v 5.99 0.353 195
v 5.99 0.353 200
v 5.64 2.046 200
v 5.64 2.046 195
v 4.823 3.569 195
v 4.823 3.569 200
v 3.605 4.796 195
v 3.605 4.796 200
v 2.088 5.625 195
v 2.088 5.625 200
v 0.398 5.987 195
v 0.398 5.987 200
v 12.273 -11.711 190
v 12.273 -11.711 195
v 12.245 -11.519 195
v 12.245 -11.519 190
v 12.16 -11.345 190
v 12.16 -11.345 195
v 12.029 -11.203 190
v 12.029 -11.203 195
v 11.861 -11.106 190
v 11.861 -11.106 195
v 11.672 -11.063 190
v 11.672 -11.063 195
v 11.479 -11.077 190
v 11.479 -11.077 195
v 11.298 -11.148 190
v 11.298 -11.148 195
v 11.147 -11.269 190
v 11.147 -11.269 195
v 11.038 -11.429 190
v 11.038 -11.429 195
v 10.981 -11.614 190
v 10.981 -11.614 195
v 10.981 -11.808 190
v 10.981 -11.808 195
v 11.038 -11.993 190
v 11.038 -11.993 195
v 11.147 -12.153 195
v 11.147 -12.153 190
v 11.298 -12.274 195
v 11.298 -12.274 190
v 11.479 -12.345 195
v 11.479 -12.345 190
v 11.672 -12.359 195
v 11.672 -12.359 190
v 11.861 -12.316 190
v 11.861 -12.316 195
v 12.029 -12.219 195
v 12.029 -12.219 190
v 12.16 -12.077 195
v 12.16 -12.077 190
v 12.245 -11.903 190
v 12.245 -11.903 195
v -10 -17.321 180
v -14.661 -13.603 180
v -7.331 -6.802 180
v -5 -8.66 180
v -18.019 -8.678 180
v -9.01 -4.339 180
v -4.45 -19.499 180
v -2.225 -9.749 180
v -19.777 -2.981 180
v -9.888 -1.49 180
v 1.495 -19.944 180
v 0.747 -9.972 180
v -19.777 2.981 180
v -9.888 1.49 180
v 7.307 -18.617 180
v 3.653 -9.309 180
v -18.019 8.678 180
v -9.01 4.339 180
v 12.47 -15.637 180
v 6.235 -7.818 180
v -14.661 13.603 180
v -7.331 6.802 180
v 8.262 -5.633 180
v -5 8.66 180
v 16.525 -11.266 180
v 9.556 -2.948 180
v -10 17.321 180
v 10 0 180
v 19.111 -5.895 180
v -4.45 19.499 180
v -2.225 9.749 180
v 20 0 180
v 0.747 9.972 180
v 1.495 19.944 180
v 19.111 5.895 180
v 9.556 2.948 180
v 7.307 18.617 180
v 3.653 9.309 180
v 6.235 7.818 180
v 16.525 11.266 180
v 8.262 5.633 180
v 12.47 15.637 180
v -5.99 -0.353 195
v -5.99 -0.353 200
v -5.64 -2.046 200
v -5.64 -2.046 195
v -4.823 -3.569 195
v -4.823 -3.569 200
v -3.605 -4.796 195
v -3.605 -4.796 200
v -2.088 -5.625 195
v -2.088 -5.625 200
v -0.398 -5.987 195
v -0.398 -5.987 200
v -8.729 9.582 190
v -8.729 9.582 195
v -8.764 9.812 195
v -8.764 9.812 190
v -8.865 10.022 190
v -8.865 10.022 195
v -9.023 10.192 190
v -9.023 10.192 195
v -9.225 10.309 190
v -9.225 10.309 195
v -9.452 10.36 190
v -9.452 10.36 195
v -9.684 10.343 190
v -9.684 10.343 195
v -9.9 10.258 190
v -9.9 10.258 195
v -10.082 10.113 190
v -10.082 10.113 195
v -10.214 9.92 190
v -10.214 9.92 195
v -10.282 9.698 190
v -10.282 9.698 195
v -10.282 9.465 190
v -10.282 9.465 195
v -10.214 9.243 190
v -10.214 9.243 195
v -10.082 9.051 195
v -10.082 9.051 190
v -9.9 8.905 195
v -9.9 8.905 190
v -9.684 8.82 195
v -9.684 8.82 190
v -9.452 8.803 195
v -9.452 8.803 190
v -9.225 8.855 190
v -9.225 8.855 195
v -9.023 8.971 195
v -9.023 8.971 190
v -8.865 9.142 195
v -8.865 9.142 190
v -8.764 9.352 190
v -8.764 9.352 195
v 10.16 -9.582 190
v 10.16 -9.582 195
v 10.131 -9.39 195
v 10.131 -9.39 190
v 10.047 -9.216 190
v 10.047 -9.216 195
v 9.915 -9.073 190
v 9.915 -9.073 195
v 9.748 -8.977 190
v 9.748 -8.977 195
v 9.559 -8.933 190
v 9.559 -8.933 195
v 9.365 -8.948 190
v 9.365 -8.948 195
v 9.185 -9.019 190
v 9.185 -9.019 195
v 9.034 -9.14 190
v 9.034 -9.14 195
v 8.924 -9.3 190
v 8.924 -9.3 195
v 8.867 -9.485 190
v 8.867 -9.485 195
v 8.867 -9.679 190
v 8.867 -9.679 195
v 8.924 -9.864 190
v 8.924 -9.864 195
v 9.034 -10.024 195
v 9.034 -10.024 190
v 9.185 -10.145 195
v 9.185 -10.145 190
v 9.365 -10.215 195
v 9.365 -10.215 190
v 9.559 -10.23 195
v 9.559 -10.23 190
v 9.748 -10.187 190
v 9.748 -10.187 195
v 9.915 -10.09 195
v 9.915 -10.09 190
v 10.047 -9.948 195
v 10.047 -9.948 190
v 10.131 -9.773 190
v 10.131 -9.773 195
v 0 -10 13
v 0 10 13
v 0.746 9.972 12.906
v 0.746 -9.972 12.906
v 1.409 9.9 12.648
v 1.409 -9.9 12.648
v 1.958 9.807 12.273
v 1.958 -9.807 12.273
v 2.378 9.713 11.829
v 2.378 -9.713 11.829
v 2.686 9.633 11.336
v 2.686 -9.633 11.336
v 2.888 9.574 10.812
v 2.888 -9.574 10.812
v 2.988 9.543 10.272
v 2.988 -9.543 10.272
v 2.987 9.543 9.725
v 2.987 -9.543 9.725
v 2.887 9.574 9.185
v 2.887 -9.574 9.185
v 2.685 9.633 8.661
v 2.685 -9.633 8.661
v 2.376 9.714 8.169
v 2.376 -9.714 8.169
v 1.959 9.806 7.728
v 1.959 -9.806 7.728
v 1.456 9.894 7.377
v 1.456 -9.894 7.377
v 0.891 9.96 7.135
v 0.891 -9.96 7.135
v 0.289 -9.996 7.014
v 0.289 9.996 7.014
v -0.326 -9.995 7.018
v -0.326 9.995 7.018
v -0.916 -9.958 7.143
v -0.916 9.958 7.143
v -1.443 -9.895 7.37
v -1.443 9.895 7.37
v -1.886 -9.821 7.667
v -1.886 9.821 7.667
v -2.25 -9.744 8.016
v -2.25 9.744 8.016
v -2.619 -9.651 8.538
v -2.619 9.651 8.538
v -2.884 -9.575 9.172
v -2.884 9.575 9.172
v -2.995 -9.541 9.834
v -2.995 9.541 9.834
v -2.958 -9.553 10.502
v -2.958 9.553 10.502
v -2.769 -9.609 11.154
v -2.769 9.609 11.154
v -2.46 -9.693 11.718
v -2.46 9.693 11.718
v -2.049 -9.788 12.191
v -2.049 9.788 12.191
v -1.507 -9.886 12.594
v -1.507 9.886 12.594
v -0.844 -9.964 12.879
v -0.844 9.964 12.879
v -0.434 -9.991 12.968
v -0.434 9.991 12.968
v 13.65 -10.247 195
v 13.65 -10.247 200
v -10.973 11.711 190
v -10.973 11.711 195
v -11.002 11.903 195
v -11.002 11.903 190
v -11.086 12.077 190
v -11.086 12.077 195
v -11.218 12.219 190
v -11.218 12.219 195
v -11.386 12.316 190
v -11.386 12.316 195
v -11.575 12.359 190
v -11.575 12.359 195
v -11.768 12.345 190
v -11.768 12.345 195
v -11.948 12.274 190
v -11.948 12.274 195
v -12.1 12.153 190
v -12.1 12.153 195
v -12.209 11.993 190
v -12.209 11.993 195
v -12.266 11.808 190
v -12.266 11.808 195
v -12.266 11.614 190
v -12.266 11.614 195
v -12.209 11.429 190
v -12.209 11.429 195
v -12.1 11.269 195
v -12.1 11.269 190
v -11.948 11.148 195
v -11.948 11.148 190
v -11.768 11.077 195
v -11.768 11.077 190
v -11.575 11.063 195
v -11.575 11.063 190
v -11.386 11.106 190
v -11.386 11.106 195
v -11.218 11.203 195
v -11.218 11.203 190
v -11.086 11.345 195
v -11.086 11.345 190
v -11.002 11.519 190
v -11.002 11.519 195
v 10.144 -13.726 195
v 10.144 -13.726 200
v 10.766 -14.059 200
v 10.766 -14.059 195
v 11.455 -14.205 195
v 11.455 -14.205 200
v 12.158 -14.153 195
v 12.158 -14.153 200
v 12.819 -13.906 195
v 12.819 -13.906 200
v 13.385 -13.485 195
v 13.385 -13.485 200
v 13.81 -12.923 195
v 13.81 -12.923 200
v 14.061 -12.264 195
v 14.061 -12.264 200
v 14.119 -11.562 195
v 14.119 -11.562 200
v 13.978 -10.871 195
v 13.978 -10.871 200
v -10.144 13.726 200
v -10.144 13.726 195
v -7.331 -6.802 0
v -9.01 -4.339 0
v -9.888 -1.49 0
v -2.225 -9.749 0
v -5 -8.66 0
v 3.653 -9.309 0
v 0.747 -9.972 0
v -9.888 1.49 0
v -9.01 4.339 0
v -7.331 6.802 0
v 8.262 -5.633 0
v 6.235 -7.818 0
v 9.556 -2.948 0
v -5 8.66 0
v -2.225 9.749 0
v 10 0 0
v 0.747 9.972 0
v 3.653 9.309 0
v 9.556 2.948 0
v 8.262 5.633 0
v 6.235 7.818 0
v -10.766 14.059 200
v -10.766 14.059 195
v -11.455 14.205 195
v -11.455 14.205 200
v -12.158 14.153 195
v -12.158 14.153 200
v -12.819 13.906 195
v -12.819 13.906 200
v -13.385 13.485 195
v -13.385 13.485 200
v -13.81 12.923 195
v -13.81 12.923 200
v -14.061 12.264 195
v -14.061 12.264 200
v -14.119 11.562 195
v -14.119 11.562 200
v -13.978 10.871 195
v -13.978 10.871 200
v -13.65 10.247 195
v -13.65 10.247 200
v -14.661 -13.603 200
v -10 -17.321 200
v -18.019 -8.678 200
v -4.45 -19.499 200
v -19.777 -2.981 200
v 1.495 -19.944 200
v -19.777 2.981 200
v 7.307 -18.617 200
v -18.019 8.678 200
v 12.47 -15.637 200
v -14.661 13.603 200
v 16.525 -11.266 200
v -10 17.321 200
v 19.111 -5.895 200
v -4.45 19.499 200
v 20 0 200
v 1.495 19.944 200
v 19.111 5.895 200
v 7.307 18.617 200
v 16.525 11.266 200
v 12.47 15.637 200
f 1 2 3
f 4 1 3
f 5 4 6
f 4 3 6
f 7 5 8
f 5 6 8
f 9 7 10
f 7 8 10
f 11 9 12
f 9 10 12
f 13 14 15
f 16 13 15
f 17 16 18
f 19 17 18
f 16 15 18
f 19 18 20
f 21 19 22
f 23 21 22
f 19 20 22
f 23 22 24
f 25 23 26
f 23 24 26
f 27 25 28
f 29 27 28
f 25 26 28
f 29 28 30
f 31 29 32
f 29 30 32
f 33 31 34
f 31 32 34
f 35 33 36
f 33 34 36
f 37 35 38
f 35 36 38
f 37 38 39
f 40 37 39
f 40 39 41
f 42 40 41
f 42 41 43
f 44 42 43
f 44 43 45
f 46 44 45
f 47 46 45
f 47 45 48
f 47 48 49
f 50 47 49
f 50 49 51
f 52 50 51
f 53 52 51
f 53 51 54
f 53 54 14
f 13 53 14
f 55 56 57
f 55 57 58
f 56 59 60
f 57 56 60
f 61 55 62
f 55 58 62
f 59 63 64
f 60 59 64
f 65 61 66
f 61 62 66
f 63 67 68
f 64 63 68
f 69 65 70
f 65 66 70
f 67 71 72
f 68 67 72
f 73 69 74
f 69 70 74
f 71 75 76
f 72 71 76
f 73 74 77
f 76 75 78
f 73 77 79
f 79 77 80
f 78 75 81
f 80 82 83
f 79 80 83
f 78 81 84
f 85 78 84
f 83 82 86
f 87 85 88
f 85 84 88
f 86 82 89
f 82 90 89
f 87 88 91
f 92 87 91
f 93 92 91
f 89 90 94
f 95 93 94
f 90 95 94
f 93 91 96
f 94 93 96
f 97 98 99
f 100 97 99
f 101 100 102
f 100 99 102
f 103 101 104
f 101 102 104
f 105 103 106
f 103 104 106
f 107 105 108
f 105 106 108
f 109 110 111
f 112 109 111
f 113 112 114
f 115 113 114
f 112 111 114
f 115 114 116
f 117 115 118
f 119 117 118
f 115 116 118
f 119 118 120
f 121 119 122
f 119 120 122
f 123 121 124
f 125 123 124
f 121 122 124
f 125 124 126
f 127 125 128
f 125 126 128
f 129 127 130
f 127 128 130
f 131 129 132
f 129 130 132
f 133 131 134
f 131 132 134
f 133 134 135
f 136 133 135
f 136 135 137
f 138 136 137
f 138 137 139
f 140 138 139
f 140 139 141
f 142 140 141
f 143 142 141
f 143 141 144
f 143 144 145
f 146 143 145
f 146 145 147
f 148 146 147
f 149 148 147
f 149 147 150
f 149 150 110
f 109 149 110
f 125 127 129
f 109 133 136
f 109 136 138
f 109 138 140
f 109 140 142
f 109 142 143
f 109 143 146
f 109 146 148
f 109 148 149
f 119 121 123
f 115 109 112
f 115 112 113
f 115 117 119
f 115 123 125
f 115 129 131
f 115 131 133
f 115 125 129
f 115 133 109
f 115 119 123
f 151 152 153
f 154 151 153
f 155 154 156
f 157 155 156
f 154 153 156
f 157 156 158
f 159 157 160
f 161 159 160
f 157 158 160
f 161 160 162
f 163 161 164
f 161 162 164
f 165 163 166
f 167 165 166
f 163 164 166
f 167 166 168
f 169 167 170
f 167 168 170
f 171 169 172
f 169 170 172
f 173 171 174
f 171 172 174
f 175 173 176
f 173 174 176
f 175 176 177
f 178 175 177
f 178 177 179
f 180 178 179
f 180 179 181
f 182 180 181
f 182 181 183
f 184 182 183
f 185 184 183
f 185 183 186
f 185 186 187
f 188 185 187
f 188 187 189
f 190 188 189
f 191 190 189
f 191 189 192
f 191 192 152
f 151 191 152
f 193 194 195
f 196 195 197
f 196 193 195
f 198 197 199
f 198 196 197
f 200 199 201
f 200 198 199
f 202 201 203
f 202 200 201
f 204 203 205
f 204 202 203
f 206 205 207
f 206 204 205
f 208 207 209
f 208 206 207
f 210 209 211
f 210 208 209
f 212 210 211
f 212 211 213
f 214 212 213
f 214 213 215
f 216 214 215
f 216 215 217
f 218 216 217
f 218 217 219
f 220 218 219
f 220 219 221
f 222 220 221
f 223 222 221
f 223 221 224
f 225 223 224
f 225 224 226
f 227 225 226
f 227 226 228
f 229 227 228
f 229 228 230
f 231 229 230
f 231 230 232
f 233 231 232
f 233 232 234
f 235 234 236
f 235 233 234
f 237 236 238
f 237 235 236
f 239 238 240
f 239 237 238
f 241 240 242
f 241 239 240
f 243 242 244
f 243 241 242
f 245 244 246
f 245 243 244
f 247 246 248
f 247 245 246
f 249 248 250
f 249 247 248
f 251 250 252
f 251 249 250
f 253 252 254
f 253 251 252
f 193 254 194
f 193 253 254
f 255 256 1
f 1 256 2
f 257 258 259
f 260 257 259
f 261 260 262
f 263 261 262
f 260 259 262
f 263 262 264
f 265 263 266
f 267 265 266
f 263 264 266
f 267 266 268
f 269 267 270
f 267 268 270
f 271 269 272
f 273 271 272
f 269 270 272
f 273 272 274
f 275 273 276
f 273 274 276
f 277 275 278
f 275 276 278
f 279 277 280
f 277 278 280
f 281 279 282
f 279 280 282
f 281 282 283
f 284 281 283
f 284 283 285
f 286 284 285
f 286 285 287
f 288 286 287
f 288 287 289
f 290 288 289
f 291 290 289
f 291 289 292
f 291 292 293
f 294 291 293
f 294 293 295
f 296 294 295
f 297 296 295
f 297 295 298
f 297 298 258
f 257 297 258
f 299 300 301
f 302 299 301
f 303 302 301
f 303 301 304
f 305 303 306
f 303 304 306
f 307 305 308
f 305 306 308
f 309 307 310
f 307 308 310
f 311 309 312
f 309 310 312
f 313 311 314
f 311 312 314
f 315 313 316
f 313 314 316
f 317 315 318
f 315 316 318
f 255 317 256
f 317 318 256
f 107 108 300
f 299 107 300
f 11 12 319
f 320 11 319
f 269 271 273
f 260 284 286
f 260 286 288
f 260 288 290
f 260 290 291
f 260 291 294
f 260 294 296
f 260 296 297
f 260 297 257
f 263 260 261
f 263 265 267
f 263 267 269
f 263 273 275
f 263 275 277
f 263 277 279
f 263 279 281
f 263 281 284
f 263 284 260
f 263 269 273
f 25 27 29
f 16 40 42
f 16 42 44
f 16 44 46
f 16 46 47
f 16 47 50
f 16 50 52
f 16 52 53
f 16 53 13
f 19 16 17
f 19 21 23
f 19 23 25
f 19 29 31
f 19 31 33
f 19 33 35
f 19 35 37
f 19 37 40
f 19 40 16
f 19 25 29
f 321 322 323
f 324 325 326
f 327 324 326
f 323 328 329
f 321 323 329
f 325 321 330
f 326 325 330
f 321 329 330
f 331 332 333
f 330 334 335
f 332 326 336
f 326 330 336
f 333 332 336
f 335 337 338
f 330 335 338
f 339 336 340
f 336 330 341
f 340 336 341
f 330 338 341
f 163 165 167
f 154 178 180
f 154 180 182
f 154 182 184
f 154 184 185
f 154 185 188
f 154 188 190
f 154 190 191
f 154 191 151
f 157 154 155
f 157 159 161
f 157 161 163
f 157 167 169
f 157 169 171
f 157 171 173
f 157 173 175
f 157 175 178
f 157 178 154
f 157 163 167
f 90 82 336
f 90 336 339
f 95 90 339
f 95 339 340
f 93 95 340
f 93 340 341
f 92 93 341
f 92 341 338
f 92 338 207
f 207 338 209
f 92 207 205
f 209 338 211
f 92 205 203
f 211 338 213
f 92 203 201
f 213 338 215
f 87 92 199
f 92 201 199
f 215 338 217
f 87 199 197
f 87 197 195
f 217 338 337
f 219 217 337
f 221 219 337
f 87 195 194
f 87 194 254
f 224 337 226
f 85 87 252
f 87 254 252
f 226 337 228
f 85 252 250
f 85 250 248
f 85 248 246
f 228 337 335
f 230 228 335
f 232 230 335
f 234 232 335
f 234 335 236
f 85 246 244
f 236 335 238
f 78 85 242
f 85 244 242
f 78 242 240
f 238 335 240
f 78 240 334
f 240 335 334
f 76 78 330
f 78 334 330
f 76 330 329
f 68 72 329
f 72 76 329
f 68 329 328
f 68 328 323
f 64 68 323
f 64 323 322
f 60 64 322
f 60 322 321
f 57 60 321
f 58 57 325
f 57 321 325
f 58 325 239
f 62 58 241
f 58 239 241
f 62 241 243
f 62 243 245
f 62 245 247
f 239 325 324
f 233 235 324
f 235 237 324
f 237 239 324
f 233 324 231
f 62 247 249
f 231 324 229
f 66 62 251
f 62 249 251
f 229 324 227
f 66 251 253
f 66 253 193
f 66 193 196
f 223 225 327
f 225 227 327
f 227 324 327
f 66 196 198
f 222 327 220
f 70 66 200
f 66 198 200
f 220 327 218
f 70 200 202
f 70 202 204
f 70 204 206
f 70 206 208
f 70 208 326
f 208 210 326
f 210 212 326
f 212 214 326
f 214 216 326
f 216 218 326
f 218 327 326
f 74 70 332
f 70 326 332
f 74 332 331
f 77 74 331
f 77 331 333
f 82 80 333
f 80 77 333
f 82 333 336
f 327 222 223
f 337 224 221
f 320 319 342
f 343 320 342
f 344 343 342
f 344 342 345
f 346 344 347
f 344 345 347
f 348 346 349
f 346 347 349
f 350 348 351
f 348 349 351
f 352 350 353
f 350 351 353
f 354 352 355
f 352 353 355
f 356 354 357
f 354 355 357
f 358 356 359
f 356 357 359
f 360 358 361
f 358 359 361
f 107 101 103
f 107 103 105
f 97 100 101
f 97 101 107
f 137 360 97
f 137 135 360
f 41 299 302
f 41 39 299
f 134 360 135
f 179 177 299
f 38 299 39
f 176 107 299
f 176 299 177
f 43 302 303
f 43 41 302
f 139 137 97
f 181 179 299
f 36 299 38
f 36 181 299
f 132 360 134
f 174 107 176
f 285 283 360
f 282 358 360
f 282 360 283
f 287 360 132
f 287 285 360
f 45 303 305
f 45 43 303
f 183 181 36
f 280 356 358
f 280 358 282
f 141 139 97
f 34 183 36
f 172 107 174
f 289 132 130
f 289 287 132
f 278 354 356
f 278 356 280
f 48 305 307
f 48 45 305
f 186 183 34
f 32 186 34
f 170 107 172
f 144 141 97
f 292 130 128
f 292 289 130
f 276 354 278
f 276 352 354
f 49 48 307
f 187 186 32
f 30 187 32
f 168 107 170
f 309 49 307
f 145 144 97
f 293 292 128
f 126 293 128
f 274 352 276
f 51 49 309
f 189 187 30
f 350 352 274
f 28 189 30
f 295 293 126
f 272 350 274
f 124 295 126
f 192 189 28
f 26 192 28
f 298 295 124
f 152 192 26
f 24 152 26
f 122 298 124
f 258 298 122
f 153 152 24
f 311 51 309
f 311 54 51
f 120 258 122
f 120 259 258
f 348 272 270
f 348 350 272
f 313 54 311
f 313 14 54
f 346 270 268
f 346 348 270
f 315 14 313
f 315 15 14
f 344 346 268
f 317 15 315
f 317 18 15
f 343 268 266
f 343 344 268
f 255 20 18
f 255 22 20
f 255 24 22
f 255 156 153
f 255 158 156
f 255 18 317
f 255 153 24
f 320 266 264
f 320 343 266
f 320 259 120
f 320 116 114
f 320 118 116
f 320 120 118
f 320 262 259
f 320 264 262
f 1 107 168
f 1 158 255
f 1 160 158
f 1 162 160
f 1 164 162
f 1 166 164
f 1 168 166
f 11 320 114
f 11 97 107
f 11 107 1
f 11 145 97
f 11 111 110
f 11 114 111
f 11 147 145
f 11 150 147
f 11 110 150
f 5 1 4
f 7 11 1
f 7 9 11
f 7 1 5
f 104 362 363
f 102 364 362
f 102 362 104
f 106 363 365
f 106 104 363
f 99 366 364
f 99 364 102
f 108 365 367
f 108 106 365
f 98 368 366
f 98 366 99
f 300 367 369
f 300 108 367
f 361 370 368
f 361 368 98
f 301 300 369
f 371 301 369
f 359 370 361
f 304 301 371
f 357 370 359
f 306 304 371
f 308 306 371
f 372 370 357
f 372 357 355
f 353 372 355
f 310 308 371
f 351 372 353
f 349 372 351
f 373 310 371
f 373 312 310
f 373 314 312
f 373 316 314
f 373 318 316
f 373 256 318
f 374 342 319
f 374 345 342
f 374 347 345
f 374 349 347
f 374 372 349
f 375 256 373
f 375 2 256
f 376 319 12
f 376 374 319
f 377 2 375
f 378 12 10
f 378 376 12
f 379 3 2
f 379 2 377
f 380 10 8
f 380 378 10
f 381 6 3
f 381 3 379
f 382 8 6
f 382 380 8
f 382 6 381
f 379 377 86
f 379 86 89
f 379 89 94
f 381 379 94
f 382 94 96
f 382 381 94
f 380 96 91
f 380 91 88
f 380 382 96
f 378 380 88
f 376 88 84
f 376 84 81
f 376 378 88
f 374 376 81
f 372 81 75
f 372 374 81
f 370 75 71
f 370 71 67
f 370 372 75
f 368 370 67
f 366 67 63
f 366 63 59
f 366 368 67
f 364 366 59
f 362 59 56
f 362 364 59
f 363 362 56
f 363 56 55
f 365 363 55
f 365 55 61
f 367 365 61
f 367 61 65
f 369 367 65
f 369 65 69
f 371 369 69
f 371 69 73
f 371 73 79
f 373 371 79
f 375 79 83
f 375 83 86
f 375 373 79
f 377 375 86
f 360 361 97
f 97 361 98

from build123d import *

# Parameters (mm, degrees)
SKETCH1_R               = 10
BOSS_EXTRUDE1_DEPTH     = 200
SKETCH2_R               = 20
BOSS_EXTRUDE2_DEPTH     = 20
SKETCH3_R               = 0.65
CUT_EXTRUDE1_DEPTH      = 5
SKETCH4_R               = 0.780836735
SKETCH4_R_2             = 0.65
CUT_EXTRUDE2_DEPTH      = 10
CUT_EXTRUDE3_DEPTH      = 202.990098767
CUT_EXTRUDE3_DEPTH_BACK = 202.990098767
SKETCH5_R               = 3


with BuildPart() as part:
    # Sketch1 → Boss-Extrude1 (new body)
    with BuildSketch(Plane.XY):
        Circle(SKETCH1_R)
    extrude(amount=BOSS_EXTRUDE1_DEPTH)

    # Sketch2 → Boss-Extrude2 (add)
    with BuildSketch(Plane.XY.offset(200)):
        Circle(SKETCH2_R)
    extrude(amount=-BOSS_EXTRUDE2_DEPTH)

    # Sketch3 → Cut-Extrude1 (cut)
    with BuildSketch(Plane.XY.offset(200)):
        with BuildLine():
            Line((0.398188886, 5.986772554), (-10.143967994, 13.726167778))
            ThreePointArc((-10.143967994, 13.726167778), (-13.384557042, 13.485311742), (-13.649708618, 10.246620085))
            Line((-13.649708618, 10.246620085), (-5.989590361, -0.353280782))
            ThreePointArc((-5.989590361, -0.353280782), (-4.258519498, -4.226702224), (-0.398188886, -5.986772554))
            Line((-0.398188886, -5.986772554), (10.143967994, -13.726167778))
            ThreePointArc((10.143967994, -13.726167778), (13.384557042, -13.485311742), (13.649708618, -10.246620085))
            Line((13.649708618, -10.246620085), (5.989590361, 0.353280782))
            ThreePointArc((5.989590361, 0.353280782), (4.258519498, 4.226702224), (0.398188886, 5.986772554))
        make_face()
        with Locations((11.623431116, -11.710928618)):
            Circle(SKETCH3_R, mode=Mode.SUBTRACT)
        with Locations((9.510080004, -9.581668869)):
            Circle(SKETCH3_R, mode=Mode.SUBTRACT)
        with Locations((-9.510080004, 9.581668869)):
            Circle(SKETCH3_R, mode=Mode.SUBTRACT)
        with Locations((-11.623431116, 11.710928618)):
            Circle(SKETCH3_R, mode=Mode.SUBTRACT)
    extrude(amount=-CUT_EXTRUDE1_DEPTH, mode=Mode.SUBTRACT)

    # Sketch4 → Cut-Extrude2 (cut)
    with BuildSketch(Plane.XY.offset(200)):
        with Locations((-9.510080004, 9.581668869)):
            Circle(SKETCH4_R)
        with Locations((-11.623431116, 11.710928618)):
            Circle(SKETCH4_R_2)
        with Locations((9.510080004, -9.581668869)):
            Circle(SKETCH4_R_2)
        with Locations((11.623431116, -11.710928618)):
            Circle(SKETCH4_R_2)
    extrude(amount=-CUT_EXTRUDE2_DEPTH, mode=Mode.SUBTRACT)

    # Sketch5 → Cut-Extrude3 (cut, two sides: drawn at the far end of the back side and taken through both)
    with BuildSketch(Plane(origin=(0, 0, 0), x_dir=(1, 0, 0), z_dir=(0, 1, 0)).offset(-CUT_EXTRUDE3_DEPTH_BACK)):
        with Locations(Location((0, -10, 0), (0, 0, 270))):
            Circle(SKETCH5_R)
    extrude(amount=CUT_EXTRUDE3_DEPTH + CUT_EXTRUDE3_DEPTH_BACK, mode=Mode.SUBTRACT)


solid = part.part
